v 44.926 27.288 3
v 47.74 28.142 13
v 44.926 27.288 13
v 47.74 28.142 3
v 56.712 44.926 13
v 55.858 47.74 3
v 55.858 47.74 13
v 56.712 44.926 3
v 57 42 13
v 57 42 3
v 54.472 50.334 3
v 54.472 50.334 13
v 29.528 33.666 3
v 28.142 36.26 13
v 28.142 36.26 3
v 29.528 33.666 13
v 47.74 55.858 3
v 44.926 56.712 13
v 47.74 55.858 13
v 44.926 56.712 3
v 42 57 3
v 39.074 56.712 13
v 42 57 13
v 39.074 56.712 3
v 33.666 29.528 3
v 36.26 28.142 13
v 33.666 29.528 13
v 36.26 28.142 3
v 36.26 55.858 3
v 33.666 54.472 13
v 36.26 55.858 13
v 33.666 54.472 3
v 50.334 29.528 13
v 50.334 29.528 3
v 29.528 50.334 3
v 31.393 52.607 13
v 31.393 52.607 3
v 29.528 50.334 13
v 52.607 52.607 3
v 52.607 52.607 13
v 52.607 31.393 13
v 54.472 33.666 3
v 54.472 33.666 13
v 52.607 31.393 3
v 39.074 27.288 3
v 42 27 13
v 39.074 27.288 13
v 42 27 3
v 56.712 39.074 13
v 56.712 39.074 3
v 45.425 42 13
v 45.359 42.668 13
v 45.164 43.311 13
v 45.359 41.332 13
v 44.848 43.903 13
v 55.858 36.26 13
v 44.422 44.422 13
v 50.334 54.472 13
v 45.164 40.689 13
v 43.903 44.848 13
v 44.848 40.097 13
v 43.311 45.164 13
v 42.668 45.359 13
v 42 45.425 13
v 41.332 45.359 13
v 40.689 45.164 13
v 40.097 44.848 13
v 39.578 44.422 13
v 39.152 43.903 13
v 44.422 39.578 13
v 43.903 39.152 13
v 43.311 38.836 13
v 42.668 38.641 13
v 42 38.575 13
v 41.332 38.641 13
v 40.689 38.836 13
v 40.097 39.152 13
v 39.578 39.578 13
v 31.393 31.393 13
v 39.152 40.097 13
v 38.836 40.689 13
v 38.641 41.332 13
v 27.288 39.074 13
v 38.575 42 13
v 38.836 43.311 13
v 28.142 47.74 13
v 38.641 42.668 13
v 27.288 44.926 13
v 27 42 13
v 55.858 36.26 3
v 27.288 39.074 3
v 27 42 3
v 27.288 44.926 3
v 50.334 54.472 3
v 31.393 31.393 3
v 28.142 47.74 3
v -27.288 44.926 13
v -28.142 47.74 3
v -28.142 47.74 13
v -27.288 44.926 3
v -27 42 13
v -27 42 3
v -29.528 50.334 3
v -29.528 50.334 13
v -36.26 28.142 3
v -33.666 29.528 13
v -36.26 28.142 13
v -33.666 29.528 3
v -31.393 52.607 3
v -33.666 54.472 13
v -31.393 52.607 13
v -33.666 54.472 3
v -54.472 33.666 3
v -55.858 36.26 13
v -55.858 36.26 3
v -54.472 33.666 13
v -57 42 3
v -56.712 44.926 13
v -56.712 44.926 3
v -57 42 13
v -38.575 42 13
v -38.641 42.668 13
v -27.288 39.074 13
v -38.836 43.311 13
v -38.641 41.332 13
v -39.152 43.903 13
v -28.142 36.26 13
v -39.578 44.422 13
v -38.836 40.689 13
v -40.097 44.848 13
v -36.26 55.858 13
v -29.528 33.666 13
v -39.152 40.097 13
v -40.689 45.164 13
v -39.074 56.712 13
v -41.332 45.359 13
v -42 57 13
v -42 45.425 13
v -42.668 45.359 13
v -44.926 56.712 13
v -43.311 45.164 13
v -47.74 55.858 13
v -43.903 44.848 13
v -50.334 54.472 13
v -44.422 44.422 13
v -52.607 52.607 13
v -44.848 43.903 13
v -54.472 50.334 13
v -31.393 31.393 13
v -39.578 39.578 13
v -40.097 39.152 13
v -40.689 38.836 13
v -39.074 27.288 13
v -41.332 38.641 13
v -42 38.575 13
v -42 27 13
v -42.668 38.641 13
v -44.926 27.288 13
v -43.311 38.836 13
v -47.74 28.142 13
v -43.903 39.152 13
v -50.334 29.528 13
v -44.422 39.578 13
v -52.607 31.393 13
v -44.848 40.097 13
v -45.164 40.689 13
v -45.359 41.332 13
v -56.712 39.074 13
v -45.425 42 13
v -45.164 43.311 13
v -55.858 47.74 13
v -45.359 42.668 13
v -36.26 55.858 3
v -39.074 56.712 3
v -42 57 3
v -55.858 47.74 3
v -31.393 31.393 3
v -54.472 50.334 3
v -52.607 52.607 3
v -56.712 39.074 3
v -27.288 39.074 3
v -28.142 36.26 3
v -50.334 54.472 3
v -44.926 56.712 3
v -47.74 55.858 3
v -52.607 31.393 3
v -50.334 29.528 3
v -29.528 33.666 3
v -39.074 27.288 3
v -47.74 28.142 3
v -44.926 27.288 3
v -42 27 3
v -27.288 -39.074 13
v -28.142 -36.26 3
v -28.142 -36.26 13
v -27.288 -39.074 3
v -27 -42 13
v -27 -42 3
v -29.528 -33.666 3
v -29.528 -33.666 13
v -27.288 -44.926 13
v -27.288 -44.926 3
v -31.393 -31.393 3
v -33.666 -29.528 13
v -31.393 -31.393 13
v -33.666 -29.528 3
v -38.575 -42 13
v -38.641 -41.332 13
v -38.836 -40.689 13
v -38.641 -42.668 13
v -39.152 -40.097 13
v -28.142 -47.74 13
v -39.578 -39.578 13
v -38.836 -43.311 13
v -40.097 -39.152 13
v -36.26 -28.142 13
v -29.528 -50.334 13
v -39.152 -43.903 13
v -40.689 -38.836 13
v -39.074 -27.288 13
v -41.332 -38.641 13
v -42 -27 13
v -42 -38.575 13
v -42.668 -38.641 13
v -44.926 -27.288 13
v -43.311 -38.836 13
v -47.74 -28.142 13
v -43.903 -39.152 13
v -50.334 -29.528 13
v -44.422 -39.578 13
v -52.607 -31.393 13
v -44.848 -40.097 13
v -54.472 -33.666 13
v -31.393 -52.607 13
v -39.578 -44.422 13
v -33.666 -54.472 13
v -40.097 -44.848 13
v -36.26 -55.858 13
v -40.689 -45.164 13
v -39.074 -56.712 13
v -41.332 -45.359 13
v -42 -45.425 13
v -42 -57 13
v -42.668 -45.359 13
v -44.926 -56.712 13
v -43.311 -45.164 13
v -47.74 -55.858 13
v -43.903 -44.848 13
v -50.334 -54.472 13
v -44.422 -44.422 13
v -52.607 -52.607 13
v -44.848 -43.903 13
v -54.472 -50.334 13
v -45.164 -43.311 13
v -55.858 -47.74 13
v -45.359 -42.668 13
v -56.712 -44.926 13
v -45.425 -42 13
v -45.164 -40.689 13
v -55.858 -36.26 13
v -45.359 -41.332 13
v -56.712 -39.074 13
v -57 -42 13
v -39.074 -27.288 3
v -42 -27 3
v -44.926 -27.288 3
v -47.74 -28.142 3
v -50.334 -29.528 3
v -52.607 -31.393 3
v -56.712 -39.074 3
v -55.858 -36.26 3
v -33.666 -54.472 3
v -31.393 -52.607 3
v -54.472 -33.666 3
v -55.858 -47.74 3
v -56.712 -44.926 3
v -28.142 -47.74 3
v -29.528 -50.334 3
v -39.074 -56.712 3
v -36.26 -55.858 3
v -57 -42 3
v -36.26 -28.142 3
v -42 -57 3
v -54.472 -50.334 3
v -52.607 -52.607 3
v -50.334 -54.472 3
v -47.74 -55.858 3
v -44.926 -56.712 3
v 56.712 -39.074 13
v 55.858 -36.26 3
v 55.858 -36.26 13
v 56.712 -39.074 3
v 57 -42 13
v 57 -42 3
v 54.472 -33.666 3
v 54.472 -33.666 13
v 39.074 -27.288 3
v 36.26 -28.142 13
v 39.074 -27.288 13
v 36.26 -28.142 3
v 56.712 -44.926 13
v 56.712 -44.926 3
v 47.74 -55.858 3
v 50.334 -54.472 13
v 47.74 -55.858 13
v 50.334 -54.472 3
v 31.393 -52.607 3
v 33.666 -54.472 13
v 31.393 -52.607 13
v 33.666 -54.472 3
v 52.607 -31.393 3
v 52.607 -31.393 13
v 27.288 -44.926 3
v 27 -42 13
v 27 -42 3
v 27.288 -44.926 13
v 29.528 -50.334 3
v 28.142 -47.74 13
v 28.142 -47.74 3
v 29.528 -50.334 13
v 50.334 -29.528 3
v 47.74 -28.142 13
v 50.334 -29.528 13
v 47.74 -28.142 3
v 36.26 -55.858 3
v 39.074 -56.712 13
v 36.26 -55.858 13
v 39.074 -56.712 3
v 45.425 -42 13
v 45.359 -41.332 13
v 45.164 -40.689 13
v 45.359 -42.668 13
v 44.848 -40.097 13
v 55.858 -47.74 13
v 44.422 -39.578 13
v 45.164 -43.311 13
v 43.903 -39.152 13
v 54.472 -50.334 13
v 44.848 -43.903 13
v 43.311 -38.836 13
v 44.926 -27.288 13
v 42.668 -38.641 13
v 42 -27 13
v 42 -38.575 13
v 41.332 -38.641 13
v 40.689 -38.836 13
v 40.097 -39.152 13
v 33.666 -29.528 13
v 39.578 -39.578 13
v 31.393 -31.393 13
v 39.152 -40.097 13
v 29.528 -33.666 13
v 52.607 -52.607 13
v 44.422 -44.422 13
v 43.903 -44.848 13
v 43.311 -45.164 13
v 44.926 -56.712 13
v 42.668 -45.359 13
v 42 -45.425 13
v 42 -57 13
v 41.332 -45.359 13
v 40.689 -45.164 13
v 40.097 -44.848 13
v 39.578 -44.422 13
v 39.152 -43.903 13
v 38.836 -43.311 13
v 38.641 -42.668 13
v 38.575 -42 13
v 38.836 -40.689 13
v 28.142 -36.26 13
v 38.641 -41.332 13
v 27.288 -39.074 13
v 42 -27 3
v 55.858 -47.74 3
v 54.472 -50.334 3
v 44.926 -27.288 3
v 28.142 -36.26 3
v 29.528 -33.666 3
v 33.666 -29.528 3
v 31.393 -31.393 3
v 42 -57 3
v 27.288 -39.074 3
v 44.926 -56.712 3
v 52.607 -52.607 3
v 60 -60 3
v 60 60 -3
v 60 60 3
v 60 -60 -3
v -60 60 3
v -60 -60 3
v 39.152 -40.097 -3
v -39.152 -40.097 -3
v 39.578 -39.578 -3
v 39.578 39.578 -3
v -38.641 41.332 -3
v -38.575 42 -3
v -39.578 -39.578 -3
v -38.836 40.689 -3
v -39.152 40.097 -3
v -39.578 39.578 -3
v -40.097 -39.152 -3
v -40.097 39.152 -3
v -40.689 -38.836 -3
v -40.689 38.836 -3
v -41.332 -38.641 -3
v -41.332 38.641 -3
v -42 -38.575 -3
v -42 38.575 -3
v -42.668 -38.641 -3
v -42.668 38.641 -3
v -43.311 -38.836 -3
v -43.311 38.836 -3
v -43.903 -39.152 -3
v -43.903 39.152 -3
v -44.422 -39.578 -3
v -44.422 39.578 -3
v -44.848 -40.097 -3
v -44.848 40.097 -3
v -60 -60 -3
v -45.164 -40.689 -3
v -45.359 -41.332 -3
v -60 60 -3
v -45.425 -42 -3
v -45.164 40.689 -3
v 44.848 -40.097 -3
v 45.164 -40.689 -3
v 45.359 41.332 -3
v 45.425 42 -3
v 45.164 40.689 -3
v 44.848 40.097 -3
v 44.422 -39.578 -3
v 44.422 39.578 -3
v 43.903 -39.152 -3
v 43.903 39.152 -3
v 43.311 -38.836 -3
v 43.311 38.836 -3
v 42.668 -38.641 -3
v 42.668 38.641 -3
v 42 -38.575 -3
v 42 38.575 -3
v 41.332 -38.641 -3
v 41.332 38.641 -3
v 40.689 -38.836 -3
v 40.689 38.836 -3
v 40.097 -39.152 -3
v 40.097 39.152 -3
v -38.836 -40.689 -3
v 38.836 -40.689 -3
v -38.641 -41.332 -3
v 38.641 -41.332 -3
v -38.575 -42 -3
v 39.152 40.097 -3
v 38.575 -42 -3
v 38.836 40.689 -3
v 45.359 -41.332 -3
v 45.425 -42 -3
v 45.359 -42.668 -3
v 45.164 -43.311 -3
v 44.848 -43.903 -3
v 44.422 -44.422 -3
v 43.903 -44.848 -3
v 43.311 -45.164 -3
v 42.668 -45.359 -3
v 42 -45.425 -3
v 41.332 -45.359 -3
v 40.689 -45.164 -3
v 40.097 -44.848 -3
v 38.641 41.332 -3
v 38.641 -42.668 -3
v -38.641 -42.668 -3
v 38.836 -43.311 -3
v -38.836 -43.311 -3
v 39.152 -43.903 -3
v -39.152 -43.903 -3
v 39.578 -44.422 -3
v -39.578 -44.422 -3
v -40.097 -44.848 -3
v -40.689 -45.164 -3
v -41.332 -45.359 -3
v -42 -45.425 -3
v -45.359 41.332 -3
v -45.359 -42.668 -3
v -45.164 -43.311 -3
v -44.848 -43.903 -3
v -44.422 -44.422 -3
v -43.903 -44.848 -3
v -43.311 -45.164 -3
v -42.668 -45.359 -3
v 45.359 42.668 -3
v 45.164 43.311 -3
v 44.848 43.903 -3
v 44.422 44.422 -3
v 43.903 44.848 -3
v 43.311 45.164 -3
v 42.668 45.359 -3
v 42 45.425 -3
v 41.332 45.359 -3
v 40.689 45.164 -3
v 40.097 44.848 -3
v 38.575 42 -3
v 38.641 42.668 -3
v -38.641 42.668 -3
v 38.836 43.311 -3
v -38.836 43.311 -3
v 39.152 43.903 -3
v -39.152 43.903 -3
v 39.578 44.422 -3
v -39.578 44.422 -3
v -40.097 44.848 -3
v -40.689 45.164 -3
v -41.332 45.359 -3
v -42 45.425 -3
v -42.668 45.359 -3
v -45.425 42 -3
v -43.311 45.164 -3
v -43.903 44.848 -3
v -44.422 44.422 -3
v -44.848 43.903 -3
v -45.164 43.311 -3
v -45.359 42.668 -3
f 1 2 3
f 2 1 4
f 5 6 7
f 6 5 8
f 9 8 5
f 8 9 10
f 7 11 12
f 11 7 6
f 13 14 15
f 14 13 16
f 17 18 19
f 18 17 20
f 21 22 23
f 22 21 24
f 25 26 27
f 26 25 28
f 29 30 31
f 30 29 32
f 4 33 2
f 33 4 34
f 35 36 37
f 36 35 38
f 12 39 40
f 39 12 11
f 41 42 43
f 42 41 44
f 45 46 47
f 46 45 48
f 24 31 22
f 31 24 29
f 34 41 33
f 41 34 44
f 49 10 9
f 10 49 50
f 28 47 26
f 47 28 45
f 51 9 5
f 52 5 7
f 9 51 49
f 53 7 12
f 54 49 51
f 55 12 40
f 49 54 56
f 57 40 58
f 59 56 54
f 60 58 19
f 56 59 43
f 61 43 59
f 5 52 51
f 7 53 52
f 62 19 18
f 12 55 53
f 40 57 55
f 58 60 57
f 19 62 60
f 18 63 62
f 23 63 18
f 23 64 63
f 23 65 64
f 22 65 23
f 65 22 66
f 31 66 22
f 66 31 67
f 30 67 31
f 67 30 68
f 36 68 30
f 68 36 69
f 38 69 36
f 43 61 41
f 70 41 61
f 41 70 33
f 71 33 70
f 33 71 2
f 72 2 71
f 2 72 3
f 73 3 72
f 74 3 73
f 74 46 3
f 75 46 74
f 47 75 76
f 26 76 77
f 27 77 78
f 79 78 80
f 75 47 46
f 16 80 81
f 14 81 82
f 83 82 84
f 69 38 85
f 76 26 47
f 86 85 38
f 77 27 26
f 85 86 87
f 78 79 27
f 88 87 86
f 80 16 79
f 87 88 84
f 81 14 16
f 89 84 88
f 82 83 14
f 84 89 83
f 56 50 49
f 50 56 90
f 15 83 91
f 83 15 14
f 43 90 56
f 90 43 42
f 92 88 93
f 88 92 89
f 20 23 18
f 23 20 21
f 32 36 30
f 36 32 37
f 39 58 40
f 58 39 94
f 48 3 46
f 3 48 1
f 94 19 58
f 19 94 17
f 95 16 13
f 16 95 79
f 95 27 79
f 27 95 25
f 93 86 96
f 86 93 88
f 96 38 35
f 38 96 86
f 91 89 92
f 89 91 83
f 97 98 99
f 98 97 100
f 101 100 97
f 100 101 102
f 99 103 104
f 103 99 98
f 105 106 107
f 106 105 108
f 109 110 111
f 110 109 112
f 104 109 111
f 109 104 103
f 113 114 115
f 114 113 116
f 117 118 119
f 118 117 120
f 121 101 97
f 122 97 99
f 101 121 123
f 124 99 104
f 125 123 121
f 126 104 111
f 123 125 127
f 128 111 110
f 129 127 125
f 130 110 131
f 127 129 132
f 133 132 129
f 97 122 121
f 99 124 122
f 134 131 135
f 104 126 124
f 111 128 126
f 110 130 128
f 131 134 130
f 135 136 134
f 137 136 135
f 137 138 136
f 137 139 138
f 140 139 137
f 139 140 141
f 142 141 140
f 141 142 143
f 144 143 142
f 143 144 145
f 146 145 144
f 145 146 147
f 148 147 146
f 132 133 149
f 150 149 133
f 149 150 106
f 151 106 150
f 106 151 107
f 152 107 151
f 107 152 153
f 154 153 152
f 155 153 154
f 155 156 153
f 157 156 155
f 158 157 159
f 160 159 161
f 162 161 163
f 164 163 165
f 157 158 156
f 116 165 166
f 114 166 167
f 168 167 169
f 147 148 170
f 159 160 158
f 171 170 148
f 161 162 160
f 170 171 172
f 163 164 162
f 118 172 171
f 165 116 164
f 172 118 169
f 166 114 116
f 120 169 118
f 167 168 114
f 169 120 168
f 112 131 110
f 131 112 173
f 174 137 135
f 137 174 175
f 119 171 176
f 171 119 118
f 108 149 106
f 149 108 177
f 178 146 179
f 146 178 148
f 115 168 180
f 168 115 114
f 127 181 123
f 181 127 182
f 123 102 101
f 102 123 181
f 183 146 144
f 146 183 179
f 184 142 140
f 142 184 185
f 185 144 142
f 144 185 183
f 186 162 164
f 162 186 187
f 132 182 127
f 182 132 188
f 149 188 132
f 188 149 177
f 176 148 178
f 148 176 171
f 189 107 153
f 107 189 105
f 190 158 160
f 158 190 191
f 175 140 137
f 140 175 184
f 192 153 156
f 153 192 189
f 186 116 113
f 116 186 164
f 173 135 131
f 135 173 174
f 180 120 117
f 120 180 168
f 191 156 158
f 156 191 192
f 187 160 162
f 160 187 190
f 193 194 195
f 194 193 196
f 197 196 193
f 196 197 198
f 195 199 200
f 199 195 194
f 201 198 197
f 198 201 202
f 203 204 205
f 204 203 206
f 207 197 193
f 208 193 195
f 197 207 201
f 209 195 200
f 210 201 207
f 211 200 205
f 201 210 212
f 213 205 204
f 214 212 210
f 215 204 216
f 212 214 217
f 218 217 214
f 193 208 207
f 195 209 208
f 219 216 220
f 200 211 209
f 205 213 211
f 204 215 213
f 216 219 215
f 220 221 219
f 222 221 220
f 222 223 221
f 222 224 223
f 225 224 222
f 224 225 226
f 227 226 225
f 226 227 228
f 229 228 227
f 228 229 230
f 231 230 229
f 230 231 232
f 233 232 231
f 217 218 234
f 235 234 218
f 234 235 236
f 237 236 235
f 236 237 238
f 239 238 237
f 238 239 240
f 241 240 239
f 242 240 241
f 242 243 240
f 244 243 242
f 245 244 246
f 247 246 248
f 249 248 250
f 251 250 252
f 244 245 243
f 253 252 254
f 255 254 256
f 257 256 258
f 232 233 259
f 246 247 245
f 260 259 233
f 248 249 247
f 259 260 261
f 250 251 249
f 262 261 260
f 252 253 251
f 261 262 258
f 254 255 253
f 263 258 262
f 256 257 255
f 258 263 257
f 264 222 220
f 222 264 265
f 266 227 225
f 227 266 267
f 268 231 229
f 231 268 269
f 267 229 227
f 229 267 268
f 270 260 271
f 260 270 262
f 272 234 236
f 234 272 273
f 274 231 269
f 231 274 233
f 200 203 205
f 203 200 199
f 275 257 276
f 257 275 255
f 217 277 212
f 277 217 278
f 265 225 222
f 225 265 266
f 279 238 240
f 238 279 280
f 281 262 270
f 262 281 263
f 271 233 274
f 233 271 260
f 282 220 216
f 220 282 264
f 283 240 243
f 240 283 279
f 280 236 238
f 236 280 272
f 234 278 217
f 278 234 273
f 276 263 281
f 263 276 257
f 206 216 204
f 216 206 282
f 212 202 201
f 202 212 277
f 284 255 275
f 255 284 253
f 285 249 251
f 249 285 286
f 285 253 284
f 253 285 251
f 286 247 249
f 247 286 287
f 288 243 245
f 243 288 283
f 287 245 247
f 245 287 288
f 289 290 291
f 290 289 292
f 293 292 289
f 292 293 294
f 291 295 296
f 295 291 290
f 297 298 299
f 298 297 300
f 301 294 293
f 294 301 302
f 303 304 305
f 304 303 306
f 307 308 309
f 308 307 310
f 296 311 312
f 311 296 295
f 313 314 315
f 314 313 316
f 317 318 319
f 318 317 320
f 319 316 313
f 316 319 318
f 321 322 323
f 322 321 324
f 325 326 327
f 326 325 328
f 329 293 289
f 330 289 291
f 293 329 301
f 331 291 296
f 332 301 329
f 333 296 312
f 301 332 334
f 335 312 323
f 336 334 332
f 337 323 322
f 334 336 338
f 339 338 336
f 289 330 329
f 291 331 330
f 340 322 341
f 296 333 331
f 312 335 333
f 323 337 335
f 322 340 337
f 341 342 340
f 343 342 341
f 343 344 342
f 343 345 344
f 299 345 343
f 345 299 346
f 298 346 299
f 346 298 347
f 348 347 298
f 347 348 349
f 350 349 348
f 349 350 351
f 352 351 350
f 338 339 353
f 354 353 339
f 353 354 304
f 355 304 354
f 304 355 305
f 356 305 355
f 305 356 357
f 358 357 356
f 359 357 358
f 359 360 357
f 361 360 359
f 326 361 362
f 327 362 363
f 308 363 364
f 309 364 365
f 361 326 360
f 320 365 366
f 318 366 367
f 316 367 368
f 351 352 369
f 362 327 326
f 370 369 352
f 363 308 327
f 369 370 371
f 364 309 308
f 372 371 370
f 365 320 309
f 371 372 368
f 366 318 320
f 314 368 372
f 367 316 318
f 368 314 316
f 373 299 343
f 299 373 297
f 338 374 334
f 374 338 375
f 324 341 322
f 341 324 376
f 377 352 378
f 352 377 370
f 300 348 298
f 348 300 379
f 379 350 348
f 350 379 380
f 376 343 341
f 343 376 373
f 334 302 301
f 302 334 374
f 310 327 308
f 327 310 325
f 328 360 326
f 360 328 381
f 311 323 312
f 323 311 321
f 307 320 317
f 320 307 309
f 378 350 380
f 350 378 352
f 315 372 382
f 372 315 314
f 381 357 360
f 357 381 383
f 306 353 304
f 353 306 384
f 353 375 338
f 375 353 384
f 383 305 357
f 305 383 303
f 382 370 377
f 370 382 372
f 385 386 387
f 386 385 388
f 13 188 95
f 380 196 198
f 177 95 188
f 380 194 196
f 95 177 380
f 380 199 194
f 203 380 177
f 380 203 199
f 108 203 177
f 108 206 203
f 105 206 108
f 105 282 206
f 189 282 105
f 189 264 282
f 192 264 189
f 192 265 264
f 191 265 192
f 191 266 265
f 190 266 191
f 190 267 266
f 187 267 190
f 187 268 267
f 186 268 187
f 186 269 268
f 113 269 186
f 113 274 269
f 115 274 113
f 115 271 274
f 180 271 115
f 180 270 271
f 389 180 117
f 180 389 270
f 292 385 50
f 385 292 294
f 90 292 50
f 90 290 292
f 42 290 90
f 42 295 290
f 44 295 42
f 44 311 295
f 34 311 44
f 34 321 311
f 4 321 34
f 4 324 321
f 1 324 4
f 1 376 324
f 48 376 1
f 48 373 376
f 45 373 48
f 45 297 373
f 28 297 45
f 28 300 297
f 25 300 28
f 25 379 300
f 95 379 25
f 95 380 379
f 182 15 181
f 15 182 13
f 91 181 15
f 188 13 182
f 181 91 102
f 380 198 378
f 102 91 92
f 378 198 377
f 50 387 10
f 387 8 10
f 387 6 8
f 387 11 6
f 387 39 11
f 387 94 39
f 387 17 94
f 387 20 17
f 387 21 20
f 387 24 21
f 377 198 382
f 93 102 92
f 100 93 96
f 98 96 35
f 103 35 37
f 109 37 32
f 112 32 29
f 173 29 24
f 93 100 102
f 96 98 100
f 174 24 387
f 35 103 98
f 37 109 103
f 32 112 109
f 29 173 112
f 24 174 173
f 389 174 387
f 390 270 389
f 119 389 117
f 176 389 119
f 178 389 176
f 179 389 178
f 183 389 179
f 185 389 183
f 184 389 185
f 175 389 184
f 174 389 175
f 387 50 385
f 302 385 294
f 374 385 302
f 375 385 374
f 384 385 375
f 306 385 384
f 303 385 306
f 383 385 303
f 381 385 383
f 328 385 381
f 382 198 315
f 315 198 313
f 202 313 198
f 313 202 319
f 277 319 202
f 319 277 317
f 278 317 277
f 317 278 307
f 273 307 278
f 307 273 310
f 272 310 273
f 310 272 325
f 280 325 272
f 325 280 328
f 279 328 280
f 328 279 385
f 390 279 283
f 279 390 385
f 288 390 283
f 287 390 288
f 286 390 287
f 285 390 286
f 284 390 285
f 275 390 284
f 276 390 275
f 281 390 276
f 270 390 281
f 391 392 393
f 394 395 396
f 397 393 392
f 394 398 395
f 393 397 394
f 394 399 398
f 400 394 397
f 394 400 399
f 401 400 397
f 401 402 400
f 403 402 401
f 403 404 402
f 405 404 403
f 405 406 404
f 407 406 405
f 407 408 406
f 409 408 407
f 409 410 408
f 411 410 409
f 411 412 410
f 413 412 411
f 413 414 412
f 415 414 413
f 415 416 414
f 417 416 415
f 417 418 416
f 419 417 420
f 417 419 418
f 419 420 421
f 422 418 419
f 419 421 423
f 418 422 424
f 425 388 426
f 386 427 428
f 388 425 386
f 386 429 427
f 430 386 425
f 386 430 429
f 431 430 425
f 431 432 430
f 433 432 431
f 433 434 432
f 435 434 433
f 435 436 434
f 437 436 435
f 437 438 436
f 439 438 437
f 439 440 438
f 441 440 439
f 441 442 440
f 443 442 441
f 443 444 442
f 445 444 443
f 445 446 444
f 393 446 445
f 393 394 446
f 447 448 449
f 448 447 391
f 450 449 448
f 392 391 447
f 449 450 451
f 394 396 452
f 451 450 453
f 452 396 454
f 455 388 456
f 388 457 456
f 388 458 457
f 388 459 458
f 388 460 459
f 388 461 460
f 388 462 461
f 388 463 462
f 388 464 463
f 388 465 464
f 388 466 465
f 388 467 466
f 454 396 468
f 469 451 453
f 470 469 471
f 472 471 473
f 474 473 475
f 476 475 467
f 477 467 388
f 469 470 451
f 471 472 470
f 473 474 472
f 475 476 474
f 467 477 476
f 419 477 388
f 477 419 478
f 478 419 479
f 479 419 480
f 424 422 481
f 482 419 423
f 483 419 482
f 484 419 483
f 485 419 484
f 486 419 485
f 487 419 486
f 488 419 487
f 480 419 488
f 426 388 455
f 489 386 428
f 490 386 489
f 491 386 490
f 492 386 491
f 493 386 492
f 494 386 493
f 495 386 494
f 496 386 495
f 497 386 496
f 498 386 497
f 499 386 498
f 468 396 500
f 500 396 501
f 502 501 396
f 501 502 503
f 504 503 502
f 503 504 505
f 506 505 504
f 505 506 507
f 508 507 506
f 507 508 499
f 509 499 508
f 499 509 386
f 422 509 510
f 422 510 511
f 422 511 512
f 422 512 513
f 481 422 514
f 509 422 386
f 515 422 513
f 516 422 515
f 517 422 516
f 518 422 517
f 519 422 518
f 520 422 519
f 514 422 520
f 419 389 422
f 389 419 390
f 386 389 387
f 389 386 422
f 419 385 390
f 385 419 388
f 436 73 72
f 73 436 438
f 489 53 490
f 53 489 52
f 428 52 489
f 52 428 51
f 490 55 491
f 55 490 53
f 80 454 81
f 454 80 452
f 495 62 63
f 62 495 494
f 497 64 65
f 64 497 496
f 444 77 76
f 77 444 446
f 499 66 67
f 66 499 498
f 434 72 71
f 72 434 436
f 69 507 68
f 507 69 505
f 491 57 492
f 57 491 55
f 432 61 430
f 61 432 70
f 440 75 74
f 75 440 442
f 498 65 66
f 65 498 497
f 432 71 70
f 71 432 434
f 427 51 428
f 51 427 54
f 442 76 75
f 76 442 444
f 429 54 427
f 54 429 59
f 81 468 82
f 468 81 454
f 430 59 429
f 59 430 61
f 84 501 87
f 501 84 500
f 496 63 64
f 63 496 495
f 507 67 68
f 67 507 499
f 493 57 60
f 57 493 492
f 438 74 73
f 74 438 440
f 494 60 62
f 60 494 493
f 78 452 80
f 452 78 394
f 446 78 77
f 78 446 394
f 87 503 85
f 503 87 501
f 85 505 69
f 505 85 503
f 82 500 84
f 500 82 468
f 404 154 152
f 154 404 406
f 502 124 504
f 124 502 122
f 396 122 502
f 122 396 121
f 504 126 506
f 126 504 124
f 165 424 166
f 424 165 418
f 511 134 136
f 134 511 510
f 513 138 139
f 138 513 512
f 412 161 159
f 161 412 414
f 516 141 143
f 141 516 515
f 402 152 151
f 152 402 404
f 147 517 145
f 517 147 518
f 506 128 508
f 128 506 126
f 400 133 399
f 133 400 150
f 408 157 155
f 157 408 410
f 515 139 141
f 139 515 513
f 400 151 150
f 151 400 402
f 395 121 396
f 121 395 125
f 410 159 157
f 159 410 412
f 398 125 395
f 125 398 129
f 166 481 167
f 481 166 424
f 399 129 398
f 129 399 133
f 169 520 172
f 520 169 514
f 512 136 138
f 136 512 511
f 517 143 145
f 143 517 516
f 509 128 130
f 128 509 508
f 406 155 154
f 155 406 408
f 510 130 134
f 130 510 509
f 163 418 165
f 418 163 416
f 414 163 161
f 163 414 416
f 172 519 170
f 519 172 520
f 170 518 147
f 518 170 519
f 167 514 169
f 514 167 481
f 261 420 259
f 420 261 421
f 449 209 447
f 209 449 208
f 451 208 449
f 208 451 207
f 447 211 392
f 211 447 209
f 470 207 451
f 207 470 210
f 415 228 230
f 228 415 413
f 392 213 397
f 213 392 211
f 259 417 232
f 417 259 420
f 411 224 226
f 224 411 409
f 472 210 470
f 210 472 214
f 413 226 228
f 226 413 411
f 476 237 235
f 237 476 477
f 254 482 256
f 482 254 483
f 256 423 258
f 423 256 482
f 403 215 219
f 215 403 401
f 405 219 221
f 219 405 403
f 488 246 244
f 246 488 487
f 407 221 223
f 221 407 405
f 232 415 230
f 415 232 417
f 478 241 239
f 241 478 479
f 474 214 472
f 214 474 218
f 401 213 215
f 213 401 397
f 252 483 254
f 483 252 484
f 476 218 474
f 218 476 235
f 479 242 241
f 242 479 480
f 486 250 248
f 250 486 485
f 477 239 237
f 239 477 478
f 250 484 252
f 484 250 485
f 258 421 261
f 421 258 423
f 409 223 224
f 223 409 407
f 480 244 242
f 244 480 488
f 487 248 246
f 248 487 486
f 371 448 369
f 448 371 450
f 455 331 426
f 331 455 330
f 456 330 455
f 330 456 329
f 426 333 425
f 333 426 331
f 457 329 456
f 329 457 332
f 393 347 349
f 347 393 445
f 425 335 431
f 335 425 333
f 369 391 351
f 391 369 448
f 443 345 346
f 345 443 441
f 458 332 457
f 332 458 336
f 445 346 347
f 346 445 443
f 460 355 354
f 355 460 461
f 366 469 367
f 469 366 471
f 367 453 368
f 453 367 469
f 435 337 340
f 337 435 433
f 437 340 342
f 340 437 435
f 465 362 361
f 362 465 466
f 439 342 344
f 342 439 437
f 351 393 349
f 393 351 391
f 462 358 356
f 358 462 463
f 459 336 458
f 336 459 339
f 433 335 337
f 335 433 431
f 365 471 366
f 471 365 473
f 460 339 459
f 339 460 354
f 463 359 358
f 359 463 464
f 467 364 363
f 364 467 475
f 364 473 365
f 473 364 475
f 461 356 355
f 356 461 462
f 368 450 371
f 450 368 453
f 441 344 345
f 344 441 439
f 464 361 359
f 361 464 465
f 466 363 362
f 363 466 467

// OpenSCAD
$fn = 32;

// ----------------------------------------------------------------------
// Anchor pads 120 x 120 x 16
// four corner bosses with anchor holes
// ----------------------------------------------------------------------

// --- parameters (mm) ---
plate = [120, 120, 6];   // base plate size (x, y, z)
pads = 4;                // boss count, one per corner
edge = 18;               // boss centre offset from the plate edge
boss_d = 30;             // boss diameter
boss_h = 10;             // boss height above the base plate
bore_d = 6.6;            // nominal hole diameter from the drawing
print_allowance = 0.25;  // clearance added for printing

// --- derived feature positions (mm) ---
hole_d = bore_d + print_allowance;  // = 6.85   hole diameter as printed
height = plate[2] + boss_h;         // = 16   overall height of the part
corner_x = plate[0] / 2 - edge;     // = 42   boss centre X
corner_y = plate[1] / 2 - edge;     // = 42   boss centre Y
feature_centers = [
  [corner_x, corner_y],
  [-corner_x, corner_y],
  [-corner_x, -corner_y],
  [corner_x, -corner_y]
];   // boss centres, anchor holes are drilled there

// base plate, four bosses standing on it, anchor holes all the way through
difference() {
  union() {
    cube(plate, center = true);
    for (centre = feature_centers)
      translate([centre[0], centre[1], plate[2] / 2 - 1])
        cylinder(d = boss_d, h = boss_h + 1);
  }
  for (centre = feature_centers)
    translate([centre[0], centre[1], -height])
      cylinder(d = hole_d, h = 2 * height + 2);  // through boss and plate
}
